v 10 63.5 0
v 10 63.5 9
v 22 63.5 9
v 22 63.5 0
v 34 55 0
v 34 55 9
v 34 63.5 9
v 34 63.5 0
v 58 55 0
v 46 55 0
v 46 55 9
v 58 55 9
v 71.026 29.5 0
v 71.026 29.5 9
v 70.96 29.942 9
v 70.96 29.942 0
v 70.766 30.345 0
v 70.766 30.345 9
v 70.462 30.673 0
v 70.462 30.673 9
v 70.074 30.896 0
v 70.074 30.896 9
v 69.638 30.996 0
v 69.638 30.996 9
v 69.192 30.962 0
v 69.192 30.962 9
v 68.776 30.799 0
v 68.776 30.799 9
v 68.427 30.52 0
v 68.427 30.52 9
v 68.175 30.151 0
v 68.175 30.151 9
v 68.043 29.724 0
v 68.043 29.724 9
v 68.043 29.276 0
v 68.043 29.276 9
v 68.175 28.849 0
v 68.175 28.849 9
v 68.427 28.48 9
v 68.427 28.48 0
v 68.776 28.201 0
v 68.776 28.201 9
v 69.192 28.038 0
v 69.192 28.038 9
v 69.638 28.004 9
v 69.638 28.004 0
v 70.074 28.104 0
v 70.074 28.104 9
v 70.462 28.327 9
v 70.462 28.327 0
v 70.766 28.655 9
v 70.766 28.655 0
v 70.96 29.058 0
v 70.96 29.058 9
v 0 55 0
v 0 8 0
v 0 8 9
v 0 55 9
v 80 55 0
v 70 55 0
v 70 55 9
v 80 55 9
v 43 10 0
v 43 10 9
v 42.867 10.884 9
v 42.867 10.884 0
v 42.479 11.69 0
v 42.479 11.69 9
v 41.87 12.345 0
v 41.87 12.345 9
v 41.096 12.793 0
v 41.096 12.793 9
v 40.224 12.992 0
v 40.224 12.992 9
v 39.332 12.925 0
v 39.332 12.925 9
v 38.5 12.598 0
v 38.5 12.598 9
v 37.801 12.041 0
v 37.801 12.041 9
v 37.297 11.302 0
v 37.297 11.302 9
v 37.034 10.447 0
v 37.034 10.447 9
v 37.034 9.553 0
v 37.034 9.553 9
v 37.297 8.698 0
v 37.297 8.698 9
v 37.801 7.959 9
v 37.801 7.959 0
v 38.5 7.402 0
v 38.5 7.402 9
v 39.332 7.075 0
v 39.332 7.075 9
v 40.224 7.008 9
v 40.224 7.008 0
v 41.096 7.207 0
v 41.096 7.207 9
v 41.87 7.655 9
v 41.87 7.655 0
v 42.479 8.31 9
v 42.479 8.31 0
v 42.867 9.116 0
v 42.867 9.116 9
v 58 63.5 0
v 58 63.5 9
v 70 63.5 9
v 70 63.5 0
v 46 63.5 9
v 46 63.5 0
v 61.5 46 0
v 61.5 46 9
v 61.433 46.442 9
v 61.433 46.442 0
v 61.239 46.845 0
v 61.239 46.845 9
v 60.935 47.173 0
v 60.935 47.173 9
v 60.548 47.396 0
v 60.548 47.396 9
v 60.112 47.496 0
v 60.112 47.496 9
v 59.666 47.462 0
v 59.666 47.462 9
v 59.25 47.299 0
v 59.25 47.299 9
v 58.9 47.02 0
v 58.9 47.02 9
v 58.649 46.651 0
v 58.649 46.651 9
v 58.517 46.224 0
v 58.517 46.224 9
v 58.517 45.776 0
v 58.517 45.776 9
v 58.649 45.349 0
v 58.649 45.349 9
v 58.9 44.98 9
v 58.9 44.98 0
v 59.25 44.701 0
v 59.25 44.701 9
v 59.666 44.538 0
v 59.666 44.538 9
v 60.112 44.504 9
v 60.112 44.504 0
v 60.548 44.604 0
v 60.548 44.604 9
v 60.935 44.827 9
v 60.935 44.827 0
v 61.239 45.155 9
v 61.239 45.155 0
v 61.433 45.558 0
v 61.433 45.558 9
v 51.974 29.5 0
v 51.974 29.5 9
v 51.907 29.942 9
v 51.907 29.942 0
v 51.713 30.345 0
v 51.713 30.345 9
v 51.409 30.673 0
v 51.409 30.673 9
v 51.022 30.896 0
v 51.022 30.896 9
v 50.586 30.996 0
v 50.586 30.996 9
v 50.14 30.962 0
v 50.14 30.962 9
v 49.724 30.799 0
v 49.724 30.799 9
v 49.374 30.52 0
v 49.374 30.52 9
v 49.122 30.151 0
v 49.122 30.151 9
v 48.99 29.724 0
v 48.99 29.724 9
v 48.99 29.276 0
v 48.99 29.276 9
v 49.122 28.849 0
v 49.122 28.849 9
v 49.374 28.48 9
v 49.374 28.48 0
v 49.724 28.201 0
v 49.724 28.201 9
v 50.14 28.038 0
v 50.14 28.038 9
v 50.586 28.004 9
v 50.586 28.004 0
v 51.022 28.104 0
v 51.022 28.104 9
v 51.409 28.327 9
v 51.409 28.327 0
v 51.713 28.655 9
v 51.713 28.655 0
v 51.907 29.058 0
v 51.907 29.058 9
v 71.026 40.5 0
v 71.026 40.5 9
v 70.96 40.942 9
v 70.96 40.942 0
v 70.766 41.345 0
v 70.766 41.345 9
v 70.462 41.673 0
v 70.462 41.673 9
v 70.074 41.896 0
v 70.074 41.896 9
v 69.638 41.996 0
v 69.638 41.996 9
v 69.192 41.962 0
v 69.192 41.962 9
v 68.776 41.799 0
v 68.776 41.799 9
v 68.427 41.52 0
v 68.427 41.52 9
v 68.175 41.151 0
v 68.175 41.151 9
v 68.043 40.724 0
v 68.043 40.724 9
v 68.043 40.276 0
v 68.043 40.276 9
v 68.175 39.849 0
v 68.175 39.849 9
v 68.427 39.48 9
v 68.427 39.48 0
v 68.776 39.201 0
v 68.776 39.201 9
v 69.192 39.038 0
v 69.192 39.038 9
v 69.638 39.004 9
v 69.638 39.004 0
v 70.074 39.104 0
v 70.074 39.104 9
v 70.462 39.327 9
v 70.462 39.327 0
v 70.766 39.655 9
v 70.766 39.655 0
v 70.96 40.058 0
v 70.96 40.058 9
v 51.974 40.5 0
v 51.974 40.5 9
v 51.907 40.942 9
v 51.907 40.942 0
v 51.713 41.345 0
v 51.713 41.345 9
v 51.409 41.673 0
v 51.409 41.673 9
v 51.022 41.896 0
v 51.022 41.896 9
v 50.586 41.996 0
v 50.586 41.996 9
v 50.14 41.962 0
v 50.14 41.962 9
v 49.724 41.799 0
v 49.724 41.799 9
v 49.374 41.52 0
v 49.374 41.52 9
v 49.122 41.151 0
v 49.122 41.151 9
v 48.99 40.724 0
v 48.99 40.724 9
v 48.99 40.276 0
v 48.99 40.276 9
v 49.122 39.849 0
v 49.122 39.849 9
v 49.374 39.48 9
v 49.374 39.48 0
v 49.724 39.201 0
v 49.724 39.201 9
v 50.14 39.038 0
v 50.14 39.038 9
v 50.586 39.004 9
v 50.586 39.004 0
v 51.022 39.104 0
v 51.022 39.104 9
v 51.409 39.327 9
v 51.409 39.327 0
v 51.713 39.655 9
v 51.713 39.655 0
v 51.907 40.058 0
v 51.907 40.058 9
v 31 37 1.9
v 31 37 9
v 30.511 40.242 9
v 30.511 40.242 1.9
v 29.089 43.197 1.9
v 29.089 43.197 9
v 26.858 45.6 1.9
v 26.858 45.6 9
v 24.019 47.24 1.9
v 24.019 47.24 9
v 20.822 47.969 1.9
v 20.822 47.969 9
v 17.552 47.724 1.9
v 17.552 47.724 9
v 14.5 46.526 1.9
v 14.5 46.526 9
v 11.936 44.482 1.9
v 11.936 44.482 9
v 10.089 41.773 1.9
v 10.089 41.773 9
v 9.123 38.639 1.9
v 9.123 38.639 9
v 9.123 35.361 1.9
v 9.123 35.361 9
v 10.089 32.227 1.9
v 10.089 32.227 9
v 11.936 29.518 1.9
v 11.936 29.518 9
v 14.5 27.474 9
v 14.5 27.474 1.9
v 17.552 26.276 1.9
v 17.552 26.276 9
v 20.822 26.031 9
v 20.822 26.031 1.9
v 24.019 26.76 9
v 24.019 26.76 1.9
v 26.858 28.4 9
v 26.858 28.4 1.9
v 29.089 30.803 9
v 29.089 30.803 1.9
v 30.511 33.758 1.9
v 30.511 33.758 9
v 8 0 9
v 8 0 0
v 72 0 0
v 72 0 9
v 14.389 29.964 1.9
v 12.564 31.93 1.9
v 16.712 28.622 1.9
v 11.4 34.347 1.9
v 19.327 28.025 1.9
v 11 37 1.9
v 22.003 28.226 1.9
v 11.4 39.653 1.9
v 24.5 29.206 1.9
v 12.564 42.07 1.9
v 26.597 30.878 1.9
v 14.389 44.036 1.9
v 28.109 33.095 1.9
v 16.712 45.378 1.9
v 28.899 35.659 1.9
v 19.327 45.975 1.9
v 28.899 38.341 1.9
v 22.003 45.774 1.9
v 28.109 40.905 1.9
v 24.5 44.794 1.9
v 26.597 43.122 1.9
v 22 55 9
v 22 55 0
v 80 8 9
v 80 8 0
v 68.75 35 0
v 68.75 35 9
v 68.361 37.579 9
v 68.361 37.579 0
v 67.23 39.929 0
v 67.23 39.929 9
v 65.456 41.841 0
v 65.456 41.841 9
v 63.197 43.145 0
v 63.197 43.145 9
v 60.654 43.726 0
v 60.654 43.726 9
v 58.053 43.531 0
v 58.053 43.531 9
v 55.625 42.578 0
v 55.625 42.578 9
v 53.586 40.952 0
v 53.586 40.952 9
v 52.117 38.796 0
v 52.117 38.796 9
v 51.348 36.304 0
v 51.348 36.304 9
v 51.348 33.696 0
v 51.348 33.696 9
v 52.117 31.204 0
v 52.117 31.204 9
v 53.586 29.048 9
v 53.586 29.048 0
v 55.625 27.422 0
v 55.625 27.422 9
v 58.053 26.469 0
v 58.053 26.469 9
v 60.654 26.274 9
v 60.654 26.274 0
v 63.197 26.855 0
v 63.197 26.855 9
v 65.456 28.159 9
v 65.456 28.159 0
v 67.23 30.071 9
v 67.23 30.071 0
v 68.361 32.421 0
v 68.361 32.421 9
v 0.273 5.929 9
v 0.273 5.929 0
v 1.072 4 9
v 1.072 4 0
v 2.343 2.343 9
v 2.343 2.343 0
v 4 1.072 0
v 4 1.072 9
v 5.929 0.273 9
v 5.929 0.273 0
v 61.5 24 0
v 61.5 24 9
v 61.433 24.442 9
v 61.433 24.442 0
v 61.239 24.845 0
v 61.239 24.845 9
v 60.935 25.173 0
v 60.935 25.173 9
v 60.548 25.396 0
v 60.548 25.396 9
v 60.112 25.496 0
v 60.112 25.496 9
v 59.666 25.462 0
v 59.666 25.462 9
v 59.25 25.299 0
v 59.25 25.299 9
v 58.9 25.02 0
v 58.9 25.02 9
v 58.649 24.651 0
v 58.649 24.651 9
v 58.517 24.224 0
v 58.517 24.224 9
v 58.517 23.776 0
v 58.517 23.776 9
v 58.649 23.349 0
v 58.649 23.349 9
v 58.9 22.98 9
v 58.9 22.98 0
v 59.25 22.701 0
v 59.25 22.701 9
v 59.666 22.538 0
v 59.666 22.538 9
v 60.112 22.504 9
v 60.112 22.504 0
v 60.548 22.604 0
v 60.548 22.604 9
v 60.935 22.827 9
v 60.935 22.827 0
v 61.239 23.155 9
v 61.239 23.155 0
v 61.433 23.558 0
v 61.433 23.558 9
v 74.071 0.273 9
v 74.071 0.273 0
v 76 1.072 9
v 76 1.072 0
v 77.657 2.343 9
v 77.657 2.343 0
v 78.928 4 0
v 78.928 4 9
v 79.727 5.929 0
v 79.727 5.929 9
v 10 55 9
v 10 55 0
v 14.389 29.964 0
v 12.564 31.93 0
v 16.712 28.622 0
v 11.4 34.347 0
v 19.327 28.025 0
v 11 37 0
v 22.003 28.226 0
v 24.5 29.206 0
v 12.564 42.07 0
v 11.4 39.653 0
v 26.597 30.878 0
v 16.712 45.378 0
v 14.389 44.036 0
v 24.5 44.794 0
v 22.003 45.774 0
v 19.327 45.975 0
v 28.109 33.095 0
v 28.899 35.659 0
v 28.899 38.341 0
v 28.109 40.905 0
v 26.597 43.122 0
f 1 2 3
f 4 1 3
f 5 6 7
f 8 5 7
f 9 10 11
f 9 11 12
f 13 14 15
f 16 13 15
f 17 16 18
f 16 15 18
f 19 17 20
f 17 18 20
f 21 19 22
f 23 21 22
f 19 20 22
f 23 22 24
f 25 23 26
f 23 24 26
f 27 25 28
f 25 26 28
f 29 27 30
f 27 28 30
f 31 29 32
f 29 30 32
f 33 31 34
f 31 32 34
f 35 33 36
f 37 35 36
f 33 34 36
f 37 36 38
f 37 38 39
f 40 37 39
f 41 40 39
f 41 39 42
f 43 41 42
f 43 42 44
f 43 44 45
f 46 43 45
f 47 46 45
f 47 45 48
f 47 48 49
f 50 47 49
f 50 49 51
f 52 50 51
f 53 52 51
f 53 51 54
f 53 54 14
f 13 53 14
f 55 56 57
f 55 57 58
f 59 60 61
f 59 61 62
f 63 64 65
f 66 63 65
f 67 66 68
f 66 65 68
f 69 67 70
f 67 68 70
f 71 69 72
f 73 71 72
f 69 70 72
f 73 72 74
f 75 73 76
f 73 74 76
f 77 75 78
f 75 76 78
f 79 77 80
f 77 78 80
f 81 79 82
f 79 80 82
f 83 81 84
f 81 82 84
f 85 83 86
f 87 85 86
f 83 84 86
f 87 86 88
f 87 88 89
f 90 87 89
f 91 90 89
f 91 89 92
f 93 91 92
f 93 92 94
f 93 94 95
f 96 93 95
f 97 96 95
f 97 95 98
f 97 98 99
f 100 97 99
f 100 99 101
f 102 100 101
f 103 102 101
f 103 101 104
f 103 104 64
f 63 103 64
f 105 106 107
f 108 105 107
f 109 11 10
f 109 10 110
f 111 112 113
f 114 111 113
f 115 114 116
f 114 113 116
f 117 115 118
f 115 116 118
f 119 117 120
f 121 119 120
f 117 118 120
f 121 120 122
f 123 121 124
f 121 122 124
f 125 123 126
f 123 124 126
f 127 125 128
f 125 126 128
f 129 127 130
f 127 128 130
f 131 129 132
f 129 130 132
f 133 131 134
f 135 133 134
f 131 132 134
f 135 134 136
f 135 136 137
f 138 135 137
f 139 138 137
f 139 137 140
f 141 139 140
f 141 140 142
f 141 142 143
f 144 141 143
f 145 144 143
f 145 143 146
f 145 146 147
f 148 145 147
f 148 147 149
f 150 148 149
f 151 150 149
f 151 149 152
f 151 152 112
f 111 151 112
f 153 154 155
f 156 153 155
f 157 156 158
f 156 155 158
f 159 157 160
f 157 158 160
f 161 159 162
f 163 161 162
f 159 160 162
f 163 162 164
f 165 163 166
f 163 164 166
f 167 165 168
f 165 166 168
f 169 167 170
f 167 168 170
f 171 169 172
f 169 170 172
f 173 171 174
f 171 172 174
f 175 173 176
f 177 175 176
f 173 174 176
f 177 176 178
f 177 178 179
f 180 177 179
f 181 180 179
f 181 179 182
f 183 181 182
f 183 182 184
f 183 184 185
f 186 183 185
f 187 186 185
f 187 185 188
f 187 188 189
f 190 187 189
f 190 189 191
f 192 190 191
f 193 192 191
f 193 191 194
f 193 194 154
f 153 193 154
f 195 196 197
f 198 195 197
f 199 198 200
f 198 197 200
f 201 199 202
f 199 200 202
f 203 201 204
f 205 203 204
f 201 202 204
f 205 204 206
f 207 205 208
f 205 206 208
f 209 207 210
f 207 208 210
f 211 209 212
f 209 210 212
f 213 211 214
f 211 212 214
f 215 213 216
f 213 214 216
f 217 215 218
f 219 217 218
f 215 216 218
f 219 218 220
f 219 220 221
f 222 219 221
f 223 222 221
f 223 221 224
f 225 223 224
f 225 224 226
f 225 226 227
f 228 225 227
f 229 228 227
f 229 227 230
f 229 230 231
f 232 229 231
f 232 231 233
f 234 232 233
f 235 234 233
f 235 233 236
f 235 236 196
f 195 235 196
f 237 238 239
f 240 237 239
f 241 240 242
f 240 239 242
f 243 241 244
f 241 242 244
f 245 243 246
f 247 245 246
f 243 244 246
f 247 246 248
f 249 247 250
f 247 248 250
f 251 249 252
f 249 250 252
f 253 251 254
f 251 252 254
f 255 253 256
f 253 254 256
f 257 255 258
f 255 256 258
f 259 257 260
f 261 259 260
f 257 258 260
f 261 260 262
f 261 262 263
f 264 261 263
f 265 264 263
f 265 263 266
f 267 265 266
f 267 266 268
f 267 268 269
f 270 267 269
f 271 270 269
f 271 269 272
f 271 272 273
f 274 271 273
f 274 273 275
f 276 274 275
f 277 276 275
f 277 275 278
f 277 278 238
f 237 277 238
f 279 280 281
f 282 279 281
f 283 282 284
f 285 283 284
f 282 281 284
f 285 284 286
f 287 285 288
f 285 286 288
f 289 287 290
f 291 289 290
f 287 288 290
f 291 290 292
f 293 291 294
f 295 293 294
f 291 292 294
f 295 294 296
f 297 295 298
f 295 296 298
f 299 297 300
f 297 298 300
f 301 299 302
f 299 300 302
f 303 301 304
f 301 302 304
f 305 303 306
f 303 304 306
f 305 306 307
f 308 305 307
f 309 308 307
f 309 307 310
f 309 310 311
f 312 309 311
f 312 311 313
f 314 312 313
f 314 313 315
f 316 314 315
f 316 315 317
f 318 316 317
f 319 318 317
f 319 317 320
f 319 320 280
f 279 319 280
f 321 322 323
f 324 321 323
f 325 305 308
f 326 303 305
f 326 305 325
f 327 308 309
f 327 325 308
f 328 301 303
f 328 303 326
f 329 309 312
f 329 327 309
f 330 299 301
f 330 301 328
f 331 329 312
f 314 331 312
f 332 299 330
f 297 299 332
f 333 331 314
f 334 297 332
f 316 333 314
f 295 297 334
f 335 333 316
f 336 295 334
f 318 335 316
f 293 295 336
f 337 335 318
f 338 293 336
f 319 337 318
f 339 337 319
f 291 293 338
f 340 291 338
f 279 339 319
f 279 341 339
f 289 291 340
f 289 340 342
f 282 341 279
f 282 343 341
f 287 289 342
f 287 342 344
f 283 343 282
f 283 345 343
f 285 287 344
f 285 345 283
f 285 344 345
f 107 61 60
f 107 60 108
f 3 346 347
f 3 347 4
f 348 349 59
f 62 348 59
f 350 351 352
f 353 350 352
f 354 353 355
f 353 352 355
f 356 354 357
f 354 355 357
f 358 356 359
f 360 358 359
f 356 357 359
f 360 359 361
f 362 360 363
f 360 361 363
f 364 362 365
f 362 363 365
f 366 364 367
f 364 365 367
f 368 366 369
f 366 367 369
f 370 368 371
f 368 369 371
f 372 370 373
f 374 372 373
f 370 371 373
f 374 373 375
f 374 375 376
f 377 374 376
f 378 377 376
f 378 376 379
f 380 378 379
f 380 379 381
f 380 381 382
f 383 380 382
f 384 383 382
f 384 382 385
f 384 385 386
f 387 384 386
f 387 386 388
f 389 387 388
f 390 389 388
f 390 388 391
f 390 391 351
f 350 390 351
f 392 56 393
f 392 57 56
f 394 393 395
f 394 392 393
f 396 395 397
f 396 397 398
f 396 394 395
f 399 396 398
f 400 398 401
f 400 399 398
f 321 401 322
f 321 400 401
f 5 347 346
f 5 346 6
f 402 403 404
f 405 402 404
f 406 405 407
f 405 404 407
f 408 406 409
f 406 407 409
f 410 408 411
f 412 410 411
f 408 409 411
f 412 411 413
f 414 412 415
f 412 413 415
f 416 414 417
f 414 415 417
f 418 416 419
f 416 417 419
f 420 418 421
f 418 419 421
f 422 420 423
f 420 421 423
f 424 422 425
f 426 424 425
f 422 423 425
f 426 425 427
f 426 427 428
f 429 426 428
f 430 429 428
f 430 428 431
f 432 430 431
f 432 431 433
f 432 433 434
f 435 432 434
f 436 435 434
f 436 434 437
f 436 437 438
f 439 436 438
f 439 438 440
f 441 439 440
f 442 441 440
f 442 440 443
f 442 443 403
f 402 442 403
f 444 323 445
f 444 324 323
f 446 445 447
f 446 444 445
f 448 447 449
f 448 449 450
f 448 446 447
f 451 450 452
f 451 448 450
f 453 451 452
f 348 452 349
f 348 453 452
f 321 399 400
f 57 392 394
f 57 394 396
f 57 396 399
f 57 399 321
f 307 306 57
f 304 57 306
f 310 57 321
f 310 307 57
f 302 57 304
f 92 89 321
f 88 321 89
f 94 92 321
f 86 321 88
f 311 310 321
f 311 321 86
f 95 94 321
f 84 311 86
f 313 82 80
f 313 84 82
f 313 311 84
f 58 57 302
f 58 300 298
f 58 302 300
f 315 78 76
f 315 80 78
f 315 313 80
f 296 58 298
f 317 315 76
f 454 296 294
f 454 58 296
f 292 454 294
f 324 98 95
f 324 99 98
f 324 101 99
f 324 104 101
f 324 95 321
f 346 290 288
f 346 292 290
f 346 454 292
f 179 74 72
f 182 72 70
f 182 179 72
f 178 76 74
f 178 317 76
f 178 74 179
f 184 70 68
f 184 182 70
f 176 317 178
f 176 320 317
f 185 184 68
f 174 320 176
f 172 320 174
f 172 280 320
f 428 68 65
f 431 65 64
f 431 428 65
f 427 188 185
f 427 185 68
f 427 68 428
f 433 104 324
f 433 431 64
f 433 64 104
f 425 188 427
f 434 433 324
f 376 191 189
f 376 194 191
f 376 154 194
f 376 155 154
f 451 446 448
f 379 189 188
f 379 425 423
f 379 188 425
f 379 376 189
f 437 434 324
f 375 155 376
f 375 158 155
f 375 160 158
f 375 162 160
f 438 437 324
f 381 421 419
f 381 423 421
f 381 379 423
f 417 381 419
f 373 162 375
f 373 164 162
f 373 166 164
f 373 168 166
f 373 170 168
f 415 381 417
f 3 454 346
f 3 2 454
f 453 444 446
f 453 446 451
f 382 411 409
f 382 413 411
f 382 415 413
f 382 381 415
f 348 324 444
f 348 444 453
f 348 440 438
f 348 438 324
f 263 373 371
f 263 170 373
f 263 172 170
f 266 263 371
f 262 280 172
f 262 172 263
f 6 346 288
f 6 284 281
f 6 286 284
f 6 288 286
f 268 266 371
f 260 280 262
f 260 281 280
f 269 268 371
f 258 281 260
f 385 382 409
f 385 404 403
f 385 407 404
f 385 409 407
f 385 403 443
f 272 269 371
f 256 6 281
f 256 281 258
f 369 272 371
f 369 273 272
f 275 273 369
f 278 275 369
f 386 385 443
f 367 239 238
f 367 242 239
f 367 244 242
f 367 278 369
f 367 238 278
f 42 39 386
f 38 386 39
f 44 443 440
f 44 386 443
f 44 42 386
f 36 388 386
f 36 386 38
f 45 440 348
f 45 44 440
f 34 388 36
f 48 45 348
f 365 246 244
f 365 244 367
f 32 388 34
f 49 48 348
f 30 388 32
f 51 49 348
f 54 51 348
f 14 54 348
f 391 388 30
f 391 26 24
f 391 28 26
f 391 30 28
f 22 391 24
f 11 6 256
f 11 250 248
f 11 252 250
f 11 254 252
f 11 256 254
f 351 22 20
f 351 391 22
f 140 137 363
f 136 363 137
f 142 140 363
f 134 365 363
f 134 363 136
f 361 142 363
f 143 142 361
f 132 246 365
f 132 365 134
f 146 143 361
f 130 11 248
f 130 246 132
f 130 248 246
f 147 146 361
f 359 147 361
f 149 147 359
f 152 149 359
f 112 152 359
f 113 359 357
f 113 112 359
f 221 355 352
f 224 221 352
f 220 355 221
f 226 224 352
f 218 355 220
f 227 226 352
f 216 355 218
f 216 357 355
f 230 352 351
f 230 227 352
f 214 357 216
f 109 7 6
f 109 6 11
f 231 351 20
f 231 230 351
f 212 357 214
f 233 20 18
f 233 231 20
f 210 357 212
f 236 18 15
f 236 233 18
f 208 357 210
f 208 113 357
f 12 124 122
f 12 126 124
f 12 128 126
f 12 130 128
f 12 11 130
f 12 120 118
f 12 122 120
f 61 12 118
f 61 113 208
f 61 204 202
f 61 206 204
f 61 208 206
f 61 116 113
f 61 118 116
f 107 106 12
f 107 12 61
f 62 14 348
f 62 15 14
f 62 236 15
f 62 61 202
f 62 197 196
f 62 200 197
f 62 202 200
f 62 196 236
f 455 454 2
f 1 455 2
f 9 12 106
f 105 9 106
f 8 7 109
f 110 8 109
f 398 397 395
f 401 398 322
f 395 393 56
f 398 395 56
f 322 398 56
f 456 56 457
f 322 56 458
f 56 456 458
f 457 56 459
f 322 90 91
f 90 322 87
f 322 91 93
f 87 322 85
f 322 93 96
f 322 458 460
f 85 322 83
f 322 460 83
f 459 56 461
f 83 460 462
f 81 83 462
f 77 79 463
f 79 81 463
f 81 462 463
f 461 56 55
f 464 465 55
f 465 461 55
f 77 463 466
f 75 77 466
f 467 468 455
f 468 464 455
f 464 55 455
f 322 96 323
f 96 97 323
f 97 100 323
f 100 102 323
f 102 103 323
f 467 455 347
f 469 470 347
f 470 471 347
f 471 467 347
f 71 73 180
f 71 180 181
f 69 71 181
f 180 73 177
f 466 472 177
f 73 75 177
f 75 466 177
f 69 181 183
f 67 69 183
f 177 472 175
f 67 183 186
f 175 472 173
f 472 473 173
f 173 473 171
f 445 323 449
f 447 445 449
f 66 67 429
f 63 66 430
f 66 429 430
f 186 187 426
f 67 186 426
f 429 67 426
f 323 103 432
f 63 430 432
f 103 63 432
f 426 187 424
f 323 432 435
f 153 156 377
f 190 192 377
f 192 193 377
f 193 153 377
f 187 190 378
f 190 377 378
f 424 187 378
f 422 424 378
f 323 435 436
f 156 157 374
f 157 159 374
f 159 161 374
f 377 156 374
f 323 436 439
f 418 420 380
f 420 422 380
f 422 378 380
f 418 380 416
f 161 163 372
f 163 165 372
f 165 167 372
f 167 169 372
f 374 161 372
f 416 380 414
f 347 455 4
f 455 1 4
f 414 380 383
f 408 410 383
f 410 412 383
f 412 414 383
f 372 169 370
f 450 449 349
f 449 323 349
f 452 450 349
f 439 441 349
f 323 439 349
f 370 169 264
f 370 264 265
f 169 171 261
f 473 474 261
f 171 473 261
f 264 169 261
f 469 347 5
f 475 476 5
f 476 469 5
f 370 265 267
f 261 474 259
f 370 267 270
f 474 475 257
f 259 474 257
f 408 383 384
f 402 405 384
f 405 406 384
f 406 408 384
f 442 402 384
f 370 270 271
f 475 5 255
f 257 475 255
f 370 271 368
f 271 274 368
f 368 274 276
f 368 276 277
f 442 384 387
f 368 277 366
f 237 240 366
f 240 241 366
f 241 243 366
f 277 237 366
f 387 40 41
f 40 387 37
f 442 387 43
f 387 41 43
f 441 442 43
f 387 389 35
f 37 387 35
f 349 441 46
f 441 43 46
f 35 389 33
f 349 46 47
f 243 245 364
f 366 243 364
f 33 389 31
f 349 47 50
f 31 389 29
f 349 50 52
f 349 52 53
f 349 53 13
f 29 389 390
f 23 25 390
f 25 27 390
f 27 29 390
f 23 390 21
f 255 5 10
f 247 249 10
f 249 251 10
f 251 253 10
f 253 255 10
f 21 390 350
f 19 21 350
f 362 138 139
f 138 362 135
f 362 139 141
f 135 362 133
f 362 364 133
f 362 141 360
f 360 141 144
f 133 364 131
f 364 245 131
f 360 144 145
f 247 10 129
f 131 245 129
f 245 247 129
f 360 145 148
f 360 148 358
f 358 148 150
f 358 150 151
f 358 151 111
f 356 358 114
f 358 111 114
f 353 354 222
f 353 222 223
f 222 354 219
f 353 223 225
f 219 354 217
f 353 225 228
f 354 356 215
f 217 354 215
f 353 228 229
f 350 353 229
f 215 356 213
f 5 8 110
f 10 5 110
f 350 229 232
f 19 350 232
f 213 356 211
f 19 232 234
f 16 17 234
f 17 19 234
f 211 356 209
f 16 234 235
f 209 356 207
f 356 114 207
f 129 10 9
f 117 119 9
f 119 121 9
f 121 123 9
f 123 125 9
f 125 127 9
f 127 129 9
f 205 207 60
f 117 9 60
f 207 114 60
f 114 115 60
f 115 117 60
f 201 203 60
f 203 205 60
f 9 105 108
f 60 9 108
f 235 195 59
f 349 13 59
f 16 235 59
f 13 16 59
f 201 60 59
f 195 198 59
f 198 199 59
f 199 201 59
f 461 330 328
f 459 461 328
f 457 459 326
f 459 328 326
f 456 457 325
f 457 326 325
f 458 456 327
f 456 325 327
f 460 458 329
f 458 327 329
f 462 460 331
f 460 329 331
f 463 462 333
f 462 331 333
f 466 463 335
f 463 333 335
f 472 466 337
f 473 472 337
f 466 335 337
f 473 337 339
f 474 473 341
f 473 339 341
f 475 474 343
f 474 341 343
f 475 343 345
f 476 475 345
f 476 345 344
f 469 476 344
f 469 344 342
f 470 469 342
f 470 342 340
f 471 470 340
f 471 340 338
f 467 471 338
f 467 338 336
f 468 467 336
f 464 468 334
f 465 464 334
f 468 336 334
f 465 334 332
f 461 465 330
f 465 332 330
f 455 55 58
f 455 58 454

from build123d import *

# Parameters (mm, degrees)
ESQUISSE1_W             = 80
ESQUISSE1_H             = 55
BOSS_EXTRU_1_DEPTH      = 9
ESQUISSE2_R             = 11
ESQUISSE2_R_2           = 8.75
ESQUISSE2_R_3           = 1.5
ENL_V_MAT_EXTRU_1_DEPTH = 98.49871794
ESQUISSE3_R             = 3
ENL_V_MAT_EXTRU_2_DEPTH = 98.49871794
CONG_1_R                = 8
BOSS_EXTRU_2_START      = 1.9
ESQUISSE4_R             = 11
ESQUISSE4_R_2           = 9
BOSS_EXTRU_2_DEPTH      = 1.9
ESQUISSE5_W             = 12
ESQUISSE5_H             = 8.5
BOSS_EXTRU_3_DEPTH      = 9


with BuildPart() as part:
    # Esquisse1 → Boss.-Extru.1 (new body)
    with BuildSketch(Plane.XY):
        with Locations((40, 27.5)):
            Rectangle(ESQUISSE1_W, ESQUISSE1_H)
    extrude(amount=BOSS_EXTRU_1_DEPTH)

    # Esquisse2 → Enlèv. mat.-Extru.1 (cut, through all)
    with BuildSketch(Plane.XY.offset(9)):
        with Locations((20, 37)):
            Circle(ESQUISSE2_R)
        with Locations((60, 35)):
            Circle(ESQUISSE2_R_2)
        with Locations((60, 46)):
            Circle(ESQUISSE2_R_3)
        with Locations((69.526279442, 40.5)):
            Circle(ESQUISSE2_R_3)
        with Locations((69.526279442, 29.5)):
            Circle(ESQUISSE2_R_3)
        with Locations((60, 24)):
            Circle(ESQUISSE2_R_3)
        with Locations((50.473720558, 29.5)):
            Circle(ESQUISSE2_R_3)
        with Locations((50.473720558, 40.5)):
            Circle(ESQUISSE2_R_3)
    extrude(amount=-ENL_V_MAT_EXTRU_1_DEPTH, mode=Mode.SUBTRACT)

    # Esquisse3 → Enlèv. mat.-Extru.2 (cut, through all)
    with BuildSketch(Plane.XY.offset(9)):
        with Locations((40, 10)):
            Circle(ESQUISSE3_R)
    extrude(amount=-ENL_V_MAT_EXTRU_2_DEPTH, mode=Mode.SUBTRACT)

    # Congé1
    cong_1_edges = [part.edges().sort_by_distance(p)[0] for p in [
        (80, 0, 4.5),
        (0, 0, 4.5),
    ]]
    fillet(cong_1_edges, radius=CONG_1_R)

    # Esquisse4 → Boss.-Extru.2 (add)
    with BuildSketch(Plane.XY.offset(BOSS_EXTRU_2_START)):
        with Locations((20, 37)):
            Circle(ESQUISSE4_R)
        with Locations(Location((20, 37, 0), (0, 0, 180))):
            Circle(ESQUISSE4_R_2, mode=Mode.SUBTRACT)
    extrude(amount=-BOSS_EXTRU_2_DEPTH)

    # Esquisse5 → Boss.-Extru.3 (add)
    with BuildSketch(Plane.XY.offset(9)):
        with Locations((40, 59.25)):
            Rectangle(ESQUISSE5_W, ESQUISSE5_H)
        with Locations((16, 59.25)):
            Rectangle(ESQUISSE5_W, ESQUISSE5_H)
        with Locations((64, 59.25)):
            Rectangle(ESQUISSE5_W, ESQUISSE5_H)
    extrude(amount=-BOSS_EXTRU_3_DEPTH)


solid = part.part
